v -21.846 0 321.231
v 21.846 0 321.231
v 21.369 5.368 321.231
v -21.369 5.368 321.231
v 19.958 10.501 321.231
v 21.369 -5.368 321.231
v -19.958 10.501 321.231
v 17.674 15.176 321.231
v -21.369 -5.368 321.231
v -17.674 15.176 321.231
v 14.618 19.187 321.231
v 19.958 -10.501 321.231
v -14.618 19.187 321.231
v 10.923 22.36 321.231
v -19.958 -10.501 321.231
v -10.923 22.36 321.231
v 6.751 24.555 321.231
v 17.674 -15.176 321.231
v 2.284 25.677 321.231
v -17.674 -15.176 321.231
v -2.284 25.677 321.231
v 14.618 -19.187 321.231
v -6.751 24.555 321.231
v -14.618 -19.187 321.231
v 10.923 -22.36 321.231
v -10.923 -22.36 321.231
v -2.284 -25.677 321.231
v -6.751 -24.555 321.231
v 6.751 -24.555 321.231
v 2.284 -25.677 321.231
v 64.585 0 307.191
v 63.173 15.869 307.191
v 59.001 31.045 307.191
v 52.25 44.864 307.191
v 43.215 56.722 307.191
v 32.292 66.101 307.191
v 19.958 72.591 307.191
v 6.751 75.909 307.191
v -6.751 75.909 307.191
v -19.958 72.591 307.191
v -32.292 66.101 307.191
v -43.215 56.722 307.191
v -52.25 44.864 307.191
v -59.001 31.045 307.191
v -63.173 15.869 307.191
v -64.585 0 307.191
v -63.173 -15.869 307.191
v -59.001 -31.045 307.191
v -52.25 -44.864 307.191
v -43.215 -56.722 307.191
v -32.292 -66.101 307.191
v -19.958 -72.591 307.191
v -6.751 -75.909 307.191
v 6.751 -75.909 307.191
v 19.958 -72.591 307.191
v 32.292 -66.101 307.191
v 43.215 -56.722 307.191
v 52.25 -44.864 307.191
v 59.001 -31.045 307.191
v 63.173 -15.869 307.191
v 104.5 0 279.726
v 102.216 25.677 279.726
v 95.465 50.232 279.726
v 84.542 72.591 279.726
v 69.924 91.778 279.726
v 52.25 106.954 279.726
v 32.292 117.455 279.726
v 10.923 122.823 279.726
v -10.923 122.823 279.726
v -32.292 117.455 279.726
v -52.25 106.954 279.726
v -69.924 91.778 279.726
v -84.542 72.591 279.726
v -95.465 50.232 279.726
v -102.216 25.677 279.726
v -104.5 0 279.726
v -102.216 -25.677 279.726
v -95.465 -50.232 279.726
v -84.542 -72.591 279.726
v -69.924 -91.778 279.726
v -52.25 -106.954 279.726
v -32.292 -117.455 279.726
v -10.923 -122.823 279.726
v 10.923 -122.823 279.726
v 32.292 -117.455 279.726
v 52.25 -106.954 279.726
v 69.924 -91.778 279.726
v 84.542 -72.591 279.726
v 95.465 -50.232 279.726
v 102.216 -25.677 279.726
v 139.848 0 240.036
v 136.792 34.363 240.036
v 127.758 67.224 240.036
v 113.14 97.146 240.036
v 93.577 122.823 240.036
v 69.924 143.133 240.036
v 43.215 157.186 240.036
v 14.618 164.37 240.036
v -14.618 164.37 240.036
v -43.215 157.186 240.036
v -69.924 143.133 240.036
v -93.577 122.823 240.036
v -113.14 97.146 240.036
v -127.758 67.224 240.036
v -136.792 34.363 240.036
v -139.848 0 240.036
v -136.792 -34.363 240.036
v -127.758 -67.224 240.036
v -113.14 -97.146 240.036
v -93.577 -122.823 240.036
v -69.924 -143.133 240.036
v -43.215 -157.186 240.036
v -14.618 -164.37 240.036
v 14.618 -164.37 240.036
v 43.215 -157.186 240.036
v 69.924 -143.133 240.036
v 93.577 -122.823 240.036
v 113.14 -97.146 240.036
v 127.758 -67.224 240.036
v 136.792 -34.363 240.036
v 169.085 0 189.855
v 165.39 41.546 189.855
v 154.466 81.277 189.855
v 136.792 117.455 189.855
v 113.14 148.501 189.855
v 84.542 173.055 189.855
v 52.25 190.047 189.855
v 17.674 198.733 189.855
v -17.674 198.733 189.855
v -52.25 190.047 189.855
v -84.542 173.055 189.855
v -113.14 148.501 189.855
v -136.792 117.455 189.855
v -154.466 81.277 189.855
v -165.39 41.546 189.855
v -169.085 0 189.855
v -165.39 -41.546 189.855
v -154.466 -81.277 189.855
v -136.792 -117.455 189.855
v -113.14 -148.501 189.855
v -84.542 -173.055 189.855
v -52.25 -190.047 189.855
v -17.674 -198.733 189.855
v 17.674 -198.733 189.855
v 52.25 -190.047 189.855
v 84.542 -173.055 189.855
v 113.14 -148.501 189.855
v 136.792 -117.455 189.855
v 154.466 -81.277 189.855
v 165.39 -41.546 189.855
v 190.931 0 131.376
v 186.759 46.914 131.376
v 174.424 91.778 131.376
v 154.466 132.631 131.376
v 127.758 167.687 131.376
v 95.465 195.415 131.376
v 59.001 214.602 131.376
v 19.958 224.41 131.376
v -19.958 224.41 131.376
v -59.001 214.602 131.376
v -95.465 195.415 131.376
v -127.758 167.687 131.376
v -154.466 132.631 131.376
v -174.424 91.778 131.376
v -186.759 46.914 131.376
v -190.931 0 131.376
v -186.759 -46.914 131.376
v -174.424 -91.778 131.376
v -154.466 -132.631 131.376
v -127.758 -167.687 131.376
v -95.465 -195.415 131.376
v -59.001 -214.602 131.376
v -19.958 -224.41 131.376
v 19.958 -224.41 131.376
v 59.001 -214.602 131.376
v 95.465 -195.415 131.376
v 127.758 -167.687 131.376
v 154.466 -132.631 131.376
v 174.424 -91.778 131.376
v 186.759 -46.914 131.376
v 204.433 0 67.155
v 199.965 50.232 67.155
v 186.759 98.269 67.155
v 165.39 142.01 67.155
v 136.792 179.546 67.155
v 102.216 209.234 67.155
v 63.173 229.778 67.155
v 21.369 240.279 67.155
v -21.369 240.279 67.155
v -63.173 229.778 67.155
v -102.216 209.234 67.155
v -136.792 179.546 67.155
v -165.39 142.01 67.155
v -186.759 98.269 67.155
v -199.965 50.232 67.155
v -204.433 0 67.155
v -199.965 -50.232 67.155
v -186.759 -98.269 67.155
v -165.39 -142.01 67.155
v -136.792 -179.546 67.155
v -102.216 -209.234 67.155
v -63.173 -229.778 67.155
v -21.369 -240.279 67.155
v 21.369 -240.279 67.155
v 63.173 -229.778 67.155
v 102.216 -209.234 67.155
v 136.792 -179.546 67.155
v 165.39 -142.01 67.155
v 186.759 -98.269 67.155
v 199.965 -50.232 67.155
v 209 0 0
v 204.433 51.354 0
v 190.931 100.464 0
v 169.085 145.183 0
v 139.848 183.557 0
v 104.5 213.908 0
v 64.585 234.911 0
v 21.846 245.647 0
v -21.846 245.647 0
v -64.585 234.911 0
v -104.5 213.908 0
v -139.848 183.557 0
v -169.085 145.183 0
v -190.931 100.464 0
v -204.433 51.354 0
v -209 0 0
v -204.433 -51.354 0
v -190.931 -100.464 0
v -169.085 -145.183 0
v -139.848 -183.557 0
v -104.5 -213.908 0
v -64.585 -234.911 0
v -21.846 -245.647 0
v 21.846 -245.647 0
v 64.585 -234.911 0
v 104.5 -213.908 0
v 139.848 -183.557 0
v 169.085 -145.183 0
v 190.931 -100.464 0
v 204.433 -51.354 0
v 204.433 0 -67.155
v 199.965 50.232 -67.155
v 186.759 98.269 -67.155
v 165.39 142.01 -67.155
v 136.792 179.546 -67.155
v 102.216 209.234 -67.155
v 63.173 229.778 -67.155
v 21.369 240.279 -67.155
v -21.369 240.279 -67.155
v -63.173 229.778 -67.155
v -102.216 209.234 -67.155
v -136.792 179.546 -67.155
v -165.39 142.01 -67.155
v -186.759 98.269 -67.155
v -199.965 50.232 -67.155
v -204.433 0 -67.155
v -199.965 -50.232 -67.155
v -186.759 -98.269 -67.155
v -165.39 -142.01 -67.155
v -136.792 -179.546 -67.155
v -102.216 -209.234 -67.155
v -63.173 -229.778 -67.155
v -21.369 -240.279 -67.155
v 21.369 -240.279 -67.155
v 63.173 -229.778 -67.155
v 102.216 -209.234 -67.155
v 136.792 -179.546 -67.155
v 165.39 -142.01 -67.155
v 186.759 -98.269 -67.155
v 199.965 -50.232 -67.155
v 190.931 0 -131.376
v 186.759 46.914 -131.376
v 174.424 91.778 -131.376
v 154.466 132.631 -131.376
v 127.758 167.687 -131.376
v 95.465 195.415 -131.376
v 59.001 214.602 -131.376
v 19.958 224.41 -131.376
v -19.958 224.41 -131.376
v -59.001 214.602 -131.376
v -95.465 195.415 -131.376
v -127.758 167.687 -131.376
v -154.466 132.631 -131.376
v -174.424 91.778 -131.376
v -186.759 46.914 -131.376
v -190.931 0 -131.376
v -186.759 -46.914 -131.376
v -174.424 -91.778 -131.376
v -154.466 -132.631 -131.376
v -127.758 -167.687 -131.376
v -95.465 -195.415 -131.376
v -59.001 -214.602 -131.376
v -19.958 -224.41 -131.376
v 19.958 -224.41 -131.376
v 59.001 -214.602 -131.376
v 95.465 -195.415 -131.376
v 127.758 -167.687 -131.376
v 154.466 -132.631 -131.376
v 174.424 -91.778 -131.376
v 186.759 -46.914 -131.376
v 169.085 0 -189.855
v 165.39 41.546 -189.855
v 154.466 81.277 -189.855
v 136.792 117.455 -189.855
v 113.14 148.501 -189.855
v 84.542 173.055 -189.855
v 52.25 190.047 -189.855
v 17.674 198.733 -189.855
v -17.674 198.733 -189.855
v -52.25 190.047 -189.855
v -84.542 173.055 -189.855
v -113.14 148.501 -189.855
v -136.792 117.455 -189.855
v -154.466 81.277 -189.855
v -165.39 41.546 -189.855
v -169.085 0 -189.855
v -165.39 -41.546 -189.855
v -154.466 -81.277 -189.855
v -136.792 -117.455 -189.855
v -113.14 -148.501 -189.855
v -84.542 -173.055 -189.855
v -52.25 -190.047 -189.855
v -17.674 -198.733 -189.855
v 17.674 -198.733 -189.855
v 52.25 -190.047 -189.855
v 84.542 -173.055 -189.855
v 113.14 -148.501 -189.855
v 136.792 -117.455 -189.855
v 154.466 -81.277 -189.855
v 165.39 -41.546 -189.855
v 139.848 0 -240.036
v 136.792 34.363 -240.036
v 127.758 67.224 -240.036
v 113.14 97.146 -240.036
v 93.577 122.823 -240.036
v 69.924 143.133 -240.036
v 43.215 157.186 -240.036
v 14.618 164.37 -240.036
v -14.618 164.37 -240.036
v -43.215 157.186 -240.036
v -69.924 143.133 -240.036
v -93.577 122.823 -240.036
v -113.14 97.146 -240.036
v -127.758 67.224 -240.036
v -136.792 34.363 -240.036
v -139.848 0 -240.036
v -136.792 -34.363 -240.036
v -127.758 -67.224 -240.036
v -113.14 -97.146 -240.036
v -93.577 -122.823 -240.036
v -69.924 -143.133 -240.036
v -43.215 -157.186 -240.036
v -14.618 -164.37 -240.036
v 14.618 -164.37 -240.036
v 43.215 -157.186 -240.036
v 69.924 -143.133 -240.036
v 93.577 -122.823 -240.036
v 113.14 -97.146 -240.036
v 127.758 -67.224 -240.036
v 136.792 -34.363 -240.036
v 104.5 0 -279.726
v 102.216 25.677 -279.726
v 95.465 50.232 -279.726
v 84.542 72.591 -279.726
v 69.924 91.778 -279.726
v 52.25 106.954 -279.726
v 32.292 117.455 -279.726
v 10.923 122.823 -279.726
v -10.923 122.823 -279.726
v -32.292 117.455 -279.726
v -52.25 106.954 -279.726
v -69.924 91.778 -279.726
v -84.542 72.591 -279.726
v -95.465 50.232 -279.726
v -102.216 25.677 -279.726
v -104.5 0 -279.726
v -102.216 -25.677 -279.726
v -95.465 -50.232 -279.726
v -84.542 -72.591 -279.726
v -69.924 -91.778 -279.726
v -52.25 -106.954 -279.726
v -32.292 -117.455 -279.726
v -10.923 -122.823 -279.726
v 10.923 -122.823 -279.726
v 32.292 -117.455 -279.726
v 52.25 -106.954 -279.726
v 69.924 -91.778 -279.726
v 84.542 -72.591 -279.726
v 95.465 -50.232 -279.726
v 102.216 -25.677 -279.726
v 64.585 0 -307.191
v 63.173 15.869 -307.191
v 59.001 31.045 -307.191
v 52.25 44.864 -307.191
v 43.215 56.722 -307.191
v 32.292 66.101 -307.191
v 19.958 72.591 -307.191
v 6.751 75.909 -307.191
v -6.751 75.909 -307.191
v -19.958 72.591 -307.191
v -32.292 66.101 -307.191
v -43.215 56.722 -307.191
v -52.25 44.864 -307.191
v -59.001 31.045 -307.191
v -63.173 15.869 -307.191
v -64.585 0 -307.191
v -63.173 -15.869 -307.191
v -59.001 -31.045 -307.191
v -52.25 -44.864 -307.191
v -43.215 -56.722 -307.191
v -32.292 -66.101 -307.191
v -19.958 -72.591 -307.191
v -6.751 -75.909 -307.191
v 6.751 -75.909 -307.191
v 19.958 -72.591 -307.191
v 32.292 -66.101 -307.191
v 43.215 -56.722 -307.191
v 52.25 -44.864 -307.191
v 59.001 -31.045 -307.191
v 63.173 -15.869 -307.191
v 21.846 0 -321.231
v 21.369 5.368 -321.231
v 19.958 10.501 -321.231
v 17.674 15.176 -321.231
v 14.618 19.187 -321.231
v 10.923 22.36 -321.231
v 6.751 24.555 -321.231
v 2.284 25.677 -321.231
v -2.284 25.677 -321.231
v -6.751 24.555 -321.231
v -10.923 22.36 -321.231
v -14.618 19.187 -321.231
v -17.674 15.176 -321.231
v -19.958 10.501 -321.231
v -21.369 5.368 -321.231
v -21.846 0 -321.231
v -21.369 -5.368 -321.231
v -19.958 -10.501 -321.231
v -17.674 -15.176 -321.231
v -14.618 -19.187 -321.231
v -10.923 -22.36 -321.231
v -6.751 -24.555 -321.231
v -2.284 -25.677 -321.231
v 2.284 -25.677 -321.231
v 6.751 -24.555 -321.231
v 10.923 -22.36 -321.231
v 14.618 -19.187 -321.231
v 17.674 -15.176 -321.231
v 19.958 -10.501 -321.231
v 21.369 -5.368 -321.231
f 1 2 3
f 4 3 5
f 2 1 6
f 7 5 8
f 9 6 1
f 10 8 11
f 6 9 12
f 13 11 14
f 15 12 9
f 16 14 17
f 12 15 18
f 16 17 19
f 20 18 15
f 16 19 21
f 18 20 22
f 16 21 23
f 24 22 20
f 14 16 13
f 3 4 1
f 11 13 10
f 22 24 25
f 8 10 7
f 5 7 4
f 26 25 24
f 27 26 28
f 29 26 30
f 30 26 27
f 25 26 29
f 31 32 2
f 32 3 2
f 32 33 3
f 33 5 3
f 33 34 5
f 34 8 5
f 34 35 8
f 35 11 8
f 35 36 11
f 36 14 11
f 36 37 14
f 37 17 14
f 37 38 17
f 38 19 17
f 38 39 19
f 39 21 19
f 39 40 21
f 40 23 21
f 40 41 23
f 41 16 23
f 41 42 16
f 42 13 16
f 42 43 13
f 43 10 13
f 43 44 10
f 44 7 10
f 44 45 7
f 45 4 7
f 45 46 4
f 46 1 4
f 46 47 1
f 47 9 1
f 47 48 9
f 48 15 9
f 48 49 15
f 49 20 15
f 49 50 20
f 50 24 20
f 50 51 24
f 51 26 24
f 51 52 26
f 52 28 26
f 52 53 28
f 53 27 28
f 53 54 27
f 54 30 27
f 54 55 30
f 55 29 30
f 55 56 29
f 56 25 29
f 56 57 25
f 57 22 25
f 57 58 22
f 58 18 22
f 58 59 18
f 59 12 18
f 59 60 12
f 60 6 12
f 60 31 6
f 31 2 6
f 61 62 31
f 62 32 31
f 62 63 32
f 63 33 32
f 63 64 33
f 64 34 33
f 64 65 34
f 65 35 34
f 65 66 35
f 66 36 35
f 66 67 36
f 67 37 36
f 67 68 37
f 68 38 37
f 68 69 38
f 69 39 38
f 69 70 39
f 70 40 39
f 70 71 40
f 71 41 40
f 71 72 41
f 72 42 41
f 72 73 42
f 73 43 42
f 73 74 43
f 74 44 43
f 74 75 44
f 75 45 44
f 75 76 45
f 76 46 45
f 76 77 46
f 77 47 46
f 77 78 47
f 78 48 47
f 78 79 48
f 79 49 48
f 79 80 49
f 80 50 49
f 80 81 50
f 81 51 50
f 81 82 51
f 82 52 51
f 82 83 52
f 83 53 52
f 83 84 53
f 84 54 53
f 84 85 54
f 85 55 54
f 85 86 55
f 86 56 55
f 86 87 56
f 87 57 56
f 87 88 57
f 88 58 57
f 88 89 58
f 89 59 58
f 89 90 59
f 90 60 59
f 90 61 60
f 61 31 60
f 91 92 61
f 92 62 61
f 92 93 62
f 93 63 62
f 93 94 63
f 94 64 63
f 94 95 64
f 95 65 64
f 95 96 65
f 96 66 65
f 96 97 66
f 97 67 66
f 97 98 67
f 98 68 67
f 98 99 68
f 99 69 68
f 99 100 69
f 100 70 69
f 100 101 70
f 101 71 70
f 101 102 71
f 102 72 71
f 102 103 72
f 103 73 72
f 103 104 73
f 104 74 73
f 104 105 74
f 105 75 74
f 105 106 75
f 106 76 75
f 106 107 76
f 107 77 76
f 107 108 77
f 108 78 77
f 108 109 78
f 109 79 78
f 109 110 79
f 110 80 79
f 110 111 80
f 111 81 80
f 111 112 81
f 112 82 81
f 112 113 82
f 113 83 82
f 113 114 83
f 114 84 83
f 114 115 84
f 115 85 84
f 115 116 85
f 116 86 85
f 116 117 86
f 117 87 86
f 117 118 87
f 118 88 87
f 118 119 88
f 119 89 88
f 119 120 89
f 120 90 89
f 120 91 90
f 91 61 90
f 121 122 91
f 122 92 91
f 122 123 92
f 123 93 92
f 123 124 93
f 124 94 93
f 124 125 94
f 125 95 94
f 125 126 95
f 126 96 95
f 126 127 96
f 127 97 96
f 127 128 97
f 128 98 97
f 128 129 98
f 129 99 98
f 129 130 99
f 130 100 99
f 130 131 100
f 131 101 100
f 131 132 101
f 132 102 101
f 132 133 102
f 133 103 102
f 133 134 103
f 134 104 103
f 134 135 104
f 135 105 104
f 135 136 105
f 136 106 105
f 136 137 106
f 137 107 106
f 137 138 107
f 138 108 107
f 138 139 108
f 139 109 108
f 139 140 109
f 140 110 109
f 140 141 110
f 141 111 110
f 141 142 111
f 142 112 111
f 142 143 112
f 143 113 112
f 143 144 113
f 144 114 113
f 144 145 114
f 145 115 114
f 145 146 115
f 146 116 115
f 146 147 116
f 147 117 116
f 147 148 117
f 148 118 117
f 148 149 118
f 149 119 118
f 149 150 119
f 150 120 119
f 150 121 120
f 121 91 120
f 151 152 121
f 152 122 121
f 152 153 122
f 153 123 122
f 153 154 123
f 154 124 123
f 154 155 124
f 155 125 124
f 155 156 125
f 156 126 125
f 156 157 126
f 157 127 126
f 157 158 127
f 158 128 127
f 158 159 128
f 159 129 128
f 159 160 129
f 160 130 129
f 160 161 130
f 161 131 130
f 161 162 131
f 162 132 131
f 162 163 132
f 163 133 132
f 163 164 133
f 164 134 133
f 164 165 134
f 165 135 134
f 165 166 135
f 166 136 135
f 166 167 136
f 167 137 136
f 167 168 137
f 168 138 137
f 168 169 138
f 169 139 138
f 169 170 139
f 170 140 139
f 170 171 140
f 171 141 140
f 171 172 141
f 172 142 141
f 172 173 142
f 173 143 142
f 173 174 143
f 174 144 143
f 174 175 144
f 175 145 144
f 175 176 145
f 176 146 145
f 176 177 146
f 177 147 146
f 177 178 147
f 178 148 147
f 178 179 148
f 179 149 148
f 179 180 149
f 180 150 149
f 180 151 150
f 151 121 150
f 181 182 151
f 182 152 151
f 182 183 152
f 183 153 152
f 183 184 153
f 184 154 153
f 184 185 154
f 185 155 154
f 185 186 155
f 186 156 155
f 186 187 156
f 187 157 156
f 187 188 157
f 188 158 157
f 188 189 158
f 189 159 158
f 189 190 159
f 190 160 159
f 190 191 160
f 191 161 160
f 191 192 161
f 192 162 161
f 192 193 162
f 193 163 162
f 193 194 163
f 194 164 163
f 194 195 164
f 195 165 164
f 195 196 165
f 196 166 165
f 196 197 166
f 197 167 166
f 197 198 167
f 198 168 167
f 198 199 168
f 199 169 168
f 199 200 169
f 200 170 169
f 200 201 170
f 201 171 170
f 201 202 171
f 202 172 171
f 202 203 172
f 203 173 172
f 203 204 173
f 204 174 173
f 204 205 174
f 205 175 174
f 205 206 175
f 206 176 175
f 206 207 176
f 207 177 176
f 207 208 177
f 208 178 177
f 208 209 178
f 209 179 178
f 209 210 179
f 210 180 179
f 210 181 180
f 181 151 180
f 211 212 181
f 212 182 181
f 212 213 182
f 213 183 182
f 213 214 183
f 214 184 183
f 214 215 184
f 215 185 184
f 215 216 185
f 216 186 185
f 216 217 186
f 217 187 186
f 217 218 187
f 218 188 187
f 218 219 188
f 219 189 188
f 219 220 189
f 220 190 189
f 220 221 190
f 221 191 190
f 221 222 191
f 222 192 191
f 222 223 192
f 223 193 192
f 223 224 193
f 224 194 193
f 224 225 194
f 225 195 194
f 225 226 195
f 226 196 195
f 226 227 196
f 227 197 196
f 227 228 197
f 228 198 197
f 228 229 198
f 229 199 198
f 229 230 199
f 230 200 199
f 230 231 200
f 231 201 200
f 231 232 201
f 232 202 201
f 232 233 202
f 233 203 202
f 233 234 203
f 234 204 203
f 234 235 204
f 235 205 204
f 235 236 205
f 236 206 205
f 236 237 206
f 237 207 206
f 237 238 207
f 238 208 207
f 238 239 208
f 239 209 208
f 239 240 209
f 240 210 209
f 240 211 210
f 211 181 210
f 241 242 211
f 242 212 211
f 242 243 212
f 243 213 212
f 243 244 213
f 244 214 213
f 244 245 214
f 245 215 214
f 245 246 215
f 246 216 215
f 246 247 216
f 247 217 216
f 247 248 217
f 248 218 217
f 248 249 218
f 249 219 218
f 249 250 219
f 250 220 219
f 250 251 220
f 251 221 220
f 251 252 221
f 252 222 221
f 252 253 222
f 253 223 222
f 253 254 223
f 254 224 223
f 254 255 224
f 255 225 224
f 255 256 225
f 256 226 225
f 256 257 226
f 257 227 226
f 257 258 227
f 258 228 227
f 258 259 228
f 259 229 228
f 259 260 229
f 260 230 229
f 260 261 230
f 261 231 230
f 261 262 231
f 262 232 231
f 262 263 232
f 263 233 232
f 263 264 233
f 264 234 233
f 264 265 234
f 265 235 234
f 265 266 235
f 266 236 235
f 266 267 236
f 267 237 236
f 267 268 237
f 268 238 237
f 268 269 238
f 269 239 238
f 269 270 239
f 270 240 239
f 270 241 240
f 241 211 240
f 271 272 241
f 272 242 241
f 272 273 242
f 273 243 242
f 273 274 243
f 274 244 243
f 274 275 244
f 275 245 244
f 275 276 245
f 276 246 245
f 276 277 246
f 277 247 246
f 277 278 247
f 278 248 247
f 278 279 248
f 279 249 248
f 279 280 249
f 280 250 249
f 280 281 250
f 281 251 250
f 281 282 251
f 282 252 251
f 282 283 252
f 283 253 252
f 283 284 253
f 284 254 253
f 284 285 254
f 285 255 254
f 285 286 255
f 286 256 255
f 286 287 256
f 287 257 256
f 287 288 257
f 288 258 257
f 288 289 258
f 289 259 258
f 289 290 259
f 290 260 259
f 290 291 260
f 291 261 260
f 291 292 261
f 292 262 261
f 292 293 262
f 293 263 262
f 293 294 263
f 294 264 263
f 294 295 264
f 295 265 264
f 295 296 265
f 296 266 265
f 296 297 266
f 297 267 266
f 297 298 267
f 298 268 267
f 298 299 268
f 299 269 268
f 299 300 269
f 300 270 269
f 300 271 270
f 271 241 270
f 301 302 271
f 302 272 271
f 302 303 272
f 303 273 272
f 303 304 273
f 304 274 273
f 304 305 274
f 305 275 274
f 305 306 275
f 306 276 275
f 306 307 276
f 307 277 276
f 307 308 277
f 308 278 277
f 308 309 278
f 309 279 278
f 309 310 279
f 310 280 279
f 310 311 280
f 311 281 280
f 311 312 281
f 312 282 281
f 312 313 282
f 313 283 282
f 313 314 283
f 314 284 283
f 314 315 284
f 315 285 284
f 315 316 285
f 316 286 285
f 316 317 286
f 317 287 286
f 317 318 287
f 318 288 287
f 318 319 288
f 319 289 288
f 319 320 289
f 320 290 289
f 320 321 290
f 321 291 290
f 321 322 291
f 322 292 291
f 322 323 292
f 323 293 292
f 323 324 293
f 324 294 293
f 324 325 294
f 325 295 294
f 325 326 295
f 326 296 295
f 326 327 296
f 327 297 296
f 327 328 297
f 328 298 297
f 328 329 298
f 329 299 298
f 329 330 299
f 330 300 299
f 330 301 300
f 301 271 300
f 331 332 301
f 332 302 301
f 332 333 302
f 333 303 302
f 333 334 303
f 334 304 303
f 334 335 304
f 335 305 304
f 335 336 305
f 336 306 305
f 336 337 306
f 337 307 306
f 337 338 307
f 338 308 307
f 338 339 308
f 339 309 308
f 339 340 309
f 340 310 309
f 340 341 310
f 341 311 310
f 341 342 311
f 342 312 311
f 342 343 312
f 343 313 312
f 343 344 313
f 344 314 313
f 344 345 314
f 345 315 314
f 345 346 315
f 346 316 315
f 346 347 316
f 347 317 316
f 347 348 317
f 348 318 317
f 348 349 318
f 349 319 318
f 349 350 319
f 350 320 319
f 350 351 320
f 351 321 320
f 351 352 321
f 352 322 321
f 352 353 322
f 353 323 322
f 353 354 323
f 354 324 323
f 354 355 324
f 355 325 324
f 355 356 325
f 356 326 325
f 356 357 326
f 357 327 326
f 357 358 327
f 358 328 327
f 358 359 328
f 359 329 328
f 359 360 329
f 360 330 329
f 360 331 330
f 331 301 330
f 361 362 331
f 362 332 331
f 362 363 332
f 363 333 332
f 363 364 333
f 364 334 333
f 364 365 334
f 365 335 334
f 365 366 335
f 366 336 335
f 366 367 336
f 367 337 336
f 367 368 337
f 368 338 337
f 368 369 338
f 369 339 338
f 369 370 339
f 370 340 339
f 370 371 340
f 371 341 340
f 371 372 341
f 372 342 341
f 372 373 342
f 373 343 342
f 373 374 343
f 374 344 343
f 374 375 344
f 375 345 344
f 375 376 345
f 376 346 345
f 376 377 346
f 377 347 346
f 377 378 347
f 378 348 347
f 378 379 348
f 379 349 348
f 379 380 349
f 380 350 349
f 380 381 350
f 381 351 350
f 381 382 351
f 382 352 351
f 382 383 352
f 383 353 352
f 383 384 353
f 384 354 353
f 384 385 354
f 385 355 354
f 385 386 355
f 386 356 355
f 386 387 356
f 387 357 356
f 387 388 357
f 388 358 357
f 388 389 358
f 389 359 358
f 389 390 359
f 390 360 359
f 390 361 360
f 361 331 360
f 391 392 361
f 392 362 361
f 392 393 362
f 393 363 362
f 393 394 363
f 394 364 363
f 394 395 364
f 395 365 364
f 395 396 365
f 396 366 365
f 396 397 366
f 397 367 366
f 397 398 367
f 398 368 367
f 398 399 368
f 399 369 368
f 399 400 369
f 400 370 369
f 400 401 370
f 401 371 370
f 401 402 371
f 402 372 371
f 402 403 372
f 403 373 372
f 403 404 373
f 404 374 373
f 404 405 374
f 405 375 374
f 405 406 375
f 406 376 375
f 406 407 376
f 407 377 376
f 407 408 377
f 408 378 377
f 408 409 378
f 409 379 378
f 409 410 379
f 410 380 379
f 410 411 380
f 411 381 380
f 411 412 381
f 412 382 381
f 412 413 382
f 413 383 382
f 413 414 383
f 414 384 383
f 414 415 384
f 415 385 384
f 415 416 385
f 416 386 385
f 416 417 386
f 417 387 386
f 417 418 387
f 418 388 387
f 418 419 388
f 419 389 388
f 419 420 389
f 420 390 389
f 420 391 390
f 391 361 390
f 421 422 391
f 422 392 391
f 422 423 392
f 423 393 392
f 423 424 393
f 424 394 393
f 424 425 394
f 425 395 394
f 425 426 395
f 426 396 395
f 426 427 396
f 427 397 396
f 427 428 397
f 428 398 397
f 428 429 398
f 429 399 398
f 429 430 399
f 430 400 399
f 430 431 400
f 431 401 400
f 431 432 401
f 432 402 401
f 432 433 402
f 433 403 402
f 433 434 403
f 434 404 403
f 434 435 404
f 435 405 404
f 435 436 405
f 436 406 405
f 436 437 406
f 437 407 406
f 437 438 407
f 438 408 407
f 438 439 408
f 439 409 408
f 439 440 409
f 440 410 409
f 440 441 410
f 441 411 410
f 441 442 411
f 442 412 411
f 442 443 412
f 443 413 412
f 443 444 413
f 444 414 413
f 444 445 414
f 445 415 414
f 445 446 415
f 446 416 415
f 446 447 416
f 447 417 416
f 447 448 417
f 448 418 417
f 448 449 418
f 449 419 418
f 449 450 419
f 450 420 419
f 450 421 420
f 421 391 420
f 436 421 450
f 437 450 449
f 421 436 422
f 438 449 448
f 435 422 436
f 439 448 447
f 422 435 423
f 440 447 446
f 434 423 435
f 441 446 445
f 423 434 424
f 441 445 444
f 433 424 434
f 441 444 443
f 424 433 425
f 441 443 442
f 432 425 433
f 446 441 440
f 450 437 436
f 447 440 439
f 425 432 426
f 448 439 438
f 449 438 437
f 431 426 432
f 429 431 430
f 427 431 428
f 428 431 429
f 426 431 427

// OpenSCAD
// Generated by SolidPython 1.0.1 on 2020-07-29 00:46:49


scale(v = [11, 13, 17]) {
	sphere(r = 19);
}
/***********************************************
*********      SolidPython code:      **********
************************************************
 
# import packages: SolidPython
from solid import *
from solid.utils import *
from itertools import chain, combinations, permutations


class Resize:

    def __init__(self, scad_file):
        self.scad_file = scad_file
        #self.scad_file = import_scad(scad_file)
        # cone/cylinder param:
        self.r1 = 0
        self.r2 = 0
        self.h = 0
        # rectangular prism param:
        self.w = 0
        self.l = 0
        # ellipse param:
        self.r = 0

    # import OpenScad code (file name corresponds to shape)


    # classify shape + parameters
    def assign(self, param1, param2, param3):
        if self.scad_file == 'cone.scad':
            self.r1 = param1
            self.r2 = param2
            self.h = param3
        elif self.scad_file == 'cylinder.scad':
            self.r1 = param1
            self.r2 = param2
            self.h = param3
        elif self.scad_file == 'rectangularPrism.scad':
            self.h = param1
            self.l = param2
            self.w = param3
        else:
            self.r = param1
            self.h = param2

    # resize parameters
    def iterate(self):
        x = range(3, 20, 2)
        i = 1
        if self.scad_file == 'cone.scad':
            tempList = list(permutations(x, 2))
            for temp in tempList:
                param1 = temp[0]
                param2 = temp[1]
                filepath = 'produced_scad_files/' + 'cone' + str(param1) + '_' + str(param2) + '_' + '.scad'
                scad_render_to_file(cylinder(h=param1, r1=param2, r2=0), filepath)

        elif self.scad_file == 'cylinder.scad':
            tempList = list(permutations(x, 3))
            for temp in tempList:
                param1 = temp[0]
                param2 = temp[1]
                filepath = 'produced_scad_files/' + 'cylinder' + str(param1) + '_' + str(param2) + '_' + '.scad'
                scad_render_to_file(cylinder(h=param1, r1=param2, r2=param2), filepath)

        elif self.scad_file == 'rectangularPrism.scad':
            tempList = list(permutations(x, 3))
            for temp in tempList:
                param1 = temp[0]
                param2 = temp[1]
                param3 = temp[2]
                filepath = 'produced_scad_files/' + 'rectangularPrism' + str(param1) + '_' + str(param2) + '_' + str(
                    param3) + '.scad'
                scad_render_to_file(cube(size=(param1, param2, param3)), filepath)

        elif self.scad_file == 'ellipse.scad':
            tempList = list(permutations(x, 4))
            for temp in tempList:
                param1 = temp[0]
                param2 = temp[1]
                param3 = temp[2]
                param4 = temp[3]
                filepath = 'produced_scad_files/' + 'ellipse' + str(param1) + '_' + str(param2) + '_' + str(param3) + '_' + str(param4) + '.scad'
                scad_render_to_file(scale([param1, param2, param3])(sphere(r=param4)), filepath)

    def render_to_scadfile(self):
        scad_render_to_file(scad, 'example.scad') 
 
************************************************/
